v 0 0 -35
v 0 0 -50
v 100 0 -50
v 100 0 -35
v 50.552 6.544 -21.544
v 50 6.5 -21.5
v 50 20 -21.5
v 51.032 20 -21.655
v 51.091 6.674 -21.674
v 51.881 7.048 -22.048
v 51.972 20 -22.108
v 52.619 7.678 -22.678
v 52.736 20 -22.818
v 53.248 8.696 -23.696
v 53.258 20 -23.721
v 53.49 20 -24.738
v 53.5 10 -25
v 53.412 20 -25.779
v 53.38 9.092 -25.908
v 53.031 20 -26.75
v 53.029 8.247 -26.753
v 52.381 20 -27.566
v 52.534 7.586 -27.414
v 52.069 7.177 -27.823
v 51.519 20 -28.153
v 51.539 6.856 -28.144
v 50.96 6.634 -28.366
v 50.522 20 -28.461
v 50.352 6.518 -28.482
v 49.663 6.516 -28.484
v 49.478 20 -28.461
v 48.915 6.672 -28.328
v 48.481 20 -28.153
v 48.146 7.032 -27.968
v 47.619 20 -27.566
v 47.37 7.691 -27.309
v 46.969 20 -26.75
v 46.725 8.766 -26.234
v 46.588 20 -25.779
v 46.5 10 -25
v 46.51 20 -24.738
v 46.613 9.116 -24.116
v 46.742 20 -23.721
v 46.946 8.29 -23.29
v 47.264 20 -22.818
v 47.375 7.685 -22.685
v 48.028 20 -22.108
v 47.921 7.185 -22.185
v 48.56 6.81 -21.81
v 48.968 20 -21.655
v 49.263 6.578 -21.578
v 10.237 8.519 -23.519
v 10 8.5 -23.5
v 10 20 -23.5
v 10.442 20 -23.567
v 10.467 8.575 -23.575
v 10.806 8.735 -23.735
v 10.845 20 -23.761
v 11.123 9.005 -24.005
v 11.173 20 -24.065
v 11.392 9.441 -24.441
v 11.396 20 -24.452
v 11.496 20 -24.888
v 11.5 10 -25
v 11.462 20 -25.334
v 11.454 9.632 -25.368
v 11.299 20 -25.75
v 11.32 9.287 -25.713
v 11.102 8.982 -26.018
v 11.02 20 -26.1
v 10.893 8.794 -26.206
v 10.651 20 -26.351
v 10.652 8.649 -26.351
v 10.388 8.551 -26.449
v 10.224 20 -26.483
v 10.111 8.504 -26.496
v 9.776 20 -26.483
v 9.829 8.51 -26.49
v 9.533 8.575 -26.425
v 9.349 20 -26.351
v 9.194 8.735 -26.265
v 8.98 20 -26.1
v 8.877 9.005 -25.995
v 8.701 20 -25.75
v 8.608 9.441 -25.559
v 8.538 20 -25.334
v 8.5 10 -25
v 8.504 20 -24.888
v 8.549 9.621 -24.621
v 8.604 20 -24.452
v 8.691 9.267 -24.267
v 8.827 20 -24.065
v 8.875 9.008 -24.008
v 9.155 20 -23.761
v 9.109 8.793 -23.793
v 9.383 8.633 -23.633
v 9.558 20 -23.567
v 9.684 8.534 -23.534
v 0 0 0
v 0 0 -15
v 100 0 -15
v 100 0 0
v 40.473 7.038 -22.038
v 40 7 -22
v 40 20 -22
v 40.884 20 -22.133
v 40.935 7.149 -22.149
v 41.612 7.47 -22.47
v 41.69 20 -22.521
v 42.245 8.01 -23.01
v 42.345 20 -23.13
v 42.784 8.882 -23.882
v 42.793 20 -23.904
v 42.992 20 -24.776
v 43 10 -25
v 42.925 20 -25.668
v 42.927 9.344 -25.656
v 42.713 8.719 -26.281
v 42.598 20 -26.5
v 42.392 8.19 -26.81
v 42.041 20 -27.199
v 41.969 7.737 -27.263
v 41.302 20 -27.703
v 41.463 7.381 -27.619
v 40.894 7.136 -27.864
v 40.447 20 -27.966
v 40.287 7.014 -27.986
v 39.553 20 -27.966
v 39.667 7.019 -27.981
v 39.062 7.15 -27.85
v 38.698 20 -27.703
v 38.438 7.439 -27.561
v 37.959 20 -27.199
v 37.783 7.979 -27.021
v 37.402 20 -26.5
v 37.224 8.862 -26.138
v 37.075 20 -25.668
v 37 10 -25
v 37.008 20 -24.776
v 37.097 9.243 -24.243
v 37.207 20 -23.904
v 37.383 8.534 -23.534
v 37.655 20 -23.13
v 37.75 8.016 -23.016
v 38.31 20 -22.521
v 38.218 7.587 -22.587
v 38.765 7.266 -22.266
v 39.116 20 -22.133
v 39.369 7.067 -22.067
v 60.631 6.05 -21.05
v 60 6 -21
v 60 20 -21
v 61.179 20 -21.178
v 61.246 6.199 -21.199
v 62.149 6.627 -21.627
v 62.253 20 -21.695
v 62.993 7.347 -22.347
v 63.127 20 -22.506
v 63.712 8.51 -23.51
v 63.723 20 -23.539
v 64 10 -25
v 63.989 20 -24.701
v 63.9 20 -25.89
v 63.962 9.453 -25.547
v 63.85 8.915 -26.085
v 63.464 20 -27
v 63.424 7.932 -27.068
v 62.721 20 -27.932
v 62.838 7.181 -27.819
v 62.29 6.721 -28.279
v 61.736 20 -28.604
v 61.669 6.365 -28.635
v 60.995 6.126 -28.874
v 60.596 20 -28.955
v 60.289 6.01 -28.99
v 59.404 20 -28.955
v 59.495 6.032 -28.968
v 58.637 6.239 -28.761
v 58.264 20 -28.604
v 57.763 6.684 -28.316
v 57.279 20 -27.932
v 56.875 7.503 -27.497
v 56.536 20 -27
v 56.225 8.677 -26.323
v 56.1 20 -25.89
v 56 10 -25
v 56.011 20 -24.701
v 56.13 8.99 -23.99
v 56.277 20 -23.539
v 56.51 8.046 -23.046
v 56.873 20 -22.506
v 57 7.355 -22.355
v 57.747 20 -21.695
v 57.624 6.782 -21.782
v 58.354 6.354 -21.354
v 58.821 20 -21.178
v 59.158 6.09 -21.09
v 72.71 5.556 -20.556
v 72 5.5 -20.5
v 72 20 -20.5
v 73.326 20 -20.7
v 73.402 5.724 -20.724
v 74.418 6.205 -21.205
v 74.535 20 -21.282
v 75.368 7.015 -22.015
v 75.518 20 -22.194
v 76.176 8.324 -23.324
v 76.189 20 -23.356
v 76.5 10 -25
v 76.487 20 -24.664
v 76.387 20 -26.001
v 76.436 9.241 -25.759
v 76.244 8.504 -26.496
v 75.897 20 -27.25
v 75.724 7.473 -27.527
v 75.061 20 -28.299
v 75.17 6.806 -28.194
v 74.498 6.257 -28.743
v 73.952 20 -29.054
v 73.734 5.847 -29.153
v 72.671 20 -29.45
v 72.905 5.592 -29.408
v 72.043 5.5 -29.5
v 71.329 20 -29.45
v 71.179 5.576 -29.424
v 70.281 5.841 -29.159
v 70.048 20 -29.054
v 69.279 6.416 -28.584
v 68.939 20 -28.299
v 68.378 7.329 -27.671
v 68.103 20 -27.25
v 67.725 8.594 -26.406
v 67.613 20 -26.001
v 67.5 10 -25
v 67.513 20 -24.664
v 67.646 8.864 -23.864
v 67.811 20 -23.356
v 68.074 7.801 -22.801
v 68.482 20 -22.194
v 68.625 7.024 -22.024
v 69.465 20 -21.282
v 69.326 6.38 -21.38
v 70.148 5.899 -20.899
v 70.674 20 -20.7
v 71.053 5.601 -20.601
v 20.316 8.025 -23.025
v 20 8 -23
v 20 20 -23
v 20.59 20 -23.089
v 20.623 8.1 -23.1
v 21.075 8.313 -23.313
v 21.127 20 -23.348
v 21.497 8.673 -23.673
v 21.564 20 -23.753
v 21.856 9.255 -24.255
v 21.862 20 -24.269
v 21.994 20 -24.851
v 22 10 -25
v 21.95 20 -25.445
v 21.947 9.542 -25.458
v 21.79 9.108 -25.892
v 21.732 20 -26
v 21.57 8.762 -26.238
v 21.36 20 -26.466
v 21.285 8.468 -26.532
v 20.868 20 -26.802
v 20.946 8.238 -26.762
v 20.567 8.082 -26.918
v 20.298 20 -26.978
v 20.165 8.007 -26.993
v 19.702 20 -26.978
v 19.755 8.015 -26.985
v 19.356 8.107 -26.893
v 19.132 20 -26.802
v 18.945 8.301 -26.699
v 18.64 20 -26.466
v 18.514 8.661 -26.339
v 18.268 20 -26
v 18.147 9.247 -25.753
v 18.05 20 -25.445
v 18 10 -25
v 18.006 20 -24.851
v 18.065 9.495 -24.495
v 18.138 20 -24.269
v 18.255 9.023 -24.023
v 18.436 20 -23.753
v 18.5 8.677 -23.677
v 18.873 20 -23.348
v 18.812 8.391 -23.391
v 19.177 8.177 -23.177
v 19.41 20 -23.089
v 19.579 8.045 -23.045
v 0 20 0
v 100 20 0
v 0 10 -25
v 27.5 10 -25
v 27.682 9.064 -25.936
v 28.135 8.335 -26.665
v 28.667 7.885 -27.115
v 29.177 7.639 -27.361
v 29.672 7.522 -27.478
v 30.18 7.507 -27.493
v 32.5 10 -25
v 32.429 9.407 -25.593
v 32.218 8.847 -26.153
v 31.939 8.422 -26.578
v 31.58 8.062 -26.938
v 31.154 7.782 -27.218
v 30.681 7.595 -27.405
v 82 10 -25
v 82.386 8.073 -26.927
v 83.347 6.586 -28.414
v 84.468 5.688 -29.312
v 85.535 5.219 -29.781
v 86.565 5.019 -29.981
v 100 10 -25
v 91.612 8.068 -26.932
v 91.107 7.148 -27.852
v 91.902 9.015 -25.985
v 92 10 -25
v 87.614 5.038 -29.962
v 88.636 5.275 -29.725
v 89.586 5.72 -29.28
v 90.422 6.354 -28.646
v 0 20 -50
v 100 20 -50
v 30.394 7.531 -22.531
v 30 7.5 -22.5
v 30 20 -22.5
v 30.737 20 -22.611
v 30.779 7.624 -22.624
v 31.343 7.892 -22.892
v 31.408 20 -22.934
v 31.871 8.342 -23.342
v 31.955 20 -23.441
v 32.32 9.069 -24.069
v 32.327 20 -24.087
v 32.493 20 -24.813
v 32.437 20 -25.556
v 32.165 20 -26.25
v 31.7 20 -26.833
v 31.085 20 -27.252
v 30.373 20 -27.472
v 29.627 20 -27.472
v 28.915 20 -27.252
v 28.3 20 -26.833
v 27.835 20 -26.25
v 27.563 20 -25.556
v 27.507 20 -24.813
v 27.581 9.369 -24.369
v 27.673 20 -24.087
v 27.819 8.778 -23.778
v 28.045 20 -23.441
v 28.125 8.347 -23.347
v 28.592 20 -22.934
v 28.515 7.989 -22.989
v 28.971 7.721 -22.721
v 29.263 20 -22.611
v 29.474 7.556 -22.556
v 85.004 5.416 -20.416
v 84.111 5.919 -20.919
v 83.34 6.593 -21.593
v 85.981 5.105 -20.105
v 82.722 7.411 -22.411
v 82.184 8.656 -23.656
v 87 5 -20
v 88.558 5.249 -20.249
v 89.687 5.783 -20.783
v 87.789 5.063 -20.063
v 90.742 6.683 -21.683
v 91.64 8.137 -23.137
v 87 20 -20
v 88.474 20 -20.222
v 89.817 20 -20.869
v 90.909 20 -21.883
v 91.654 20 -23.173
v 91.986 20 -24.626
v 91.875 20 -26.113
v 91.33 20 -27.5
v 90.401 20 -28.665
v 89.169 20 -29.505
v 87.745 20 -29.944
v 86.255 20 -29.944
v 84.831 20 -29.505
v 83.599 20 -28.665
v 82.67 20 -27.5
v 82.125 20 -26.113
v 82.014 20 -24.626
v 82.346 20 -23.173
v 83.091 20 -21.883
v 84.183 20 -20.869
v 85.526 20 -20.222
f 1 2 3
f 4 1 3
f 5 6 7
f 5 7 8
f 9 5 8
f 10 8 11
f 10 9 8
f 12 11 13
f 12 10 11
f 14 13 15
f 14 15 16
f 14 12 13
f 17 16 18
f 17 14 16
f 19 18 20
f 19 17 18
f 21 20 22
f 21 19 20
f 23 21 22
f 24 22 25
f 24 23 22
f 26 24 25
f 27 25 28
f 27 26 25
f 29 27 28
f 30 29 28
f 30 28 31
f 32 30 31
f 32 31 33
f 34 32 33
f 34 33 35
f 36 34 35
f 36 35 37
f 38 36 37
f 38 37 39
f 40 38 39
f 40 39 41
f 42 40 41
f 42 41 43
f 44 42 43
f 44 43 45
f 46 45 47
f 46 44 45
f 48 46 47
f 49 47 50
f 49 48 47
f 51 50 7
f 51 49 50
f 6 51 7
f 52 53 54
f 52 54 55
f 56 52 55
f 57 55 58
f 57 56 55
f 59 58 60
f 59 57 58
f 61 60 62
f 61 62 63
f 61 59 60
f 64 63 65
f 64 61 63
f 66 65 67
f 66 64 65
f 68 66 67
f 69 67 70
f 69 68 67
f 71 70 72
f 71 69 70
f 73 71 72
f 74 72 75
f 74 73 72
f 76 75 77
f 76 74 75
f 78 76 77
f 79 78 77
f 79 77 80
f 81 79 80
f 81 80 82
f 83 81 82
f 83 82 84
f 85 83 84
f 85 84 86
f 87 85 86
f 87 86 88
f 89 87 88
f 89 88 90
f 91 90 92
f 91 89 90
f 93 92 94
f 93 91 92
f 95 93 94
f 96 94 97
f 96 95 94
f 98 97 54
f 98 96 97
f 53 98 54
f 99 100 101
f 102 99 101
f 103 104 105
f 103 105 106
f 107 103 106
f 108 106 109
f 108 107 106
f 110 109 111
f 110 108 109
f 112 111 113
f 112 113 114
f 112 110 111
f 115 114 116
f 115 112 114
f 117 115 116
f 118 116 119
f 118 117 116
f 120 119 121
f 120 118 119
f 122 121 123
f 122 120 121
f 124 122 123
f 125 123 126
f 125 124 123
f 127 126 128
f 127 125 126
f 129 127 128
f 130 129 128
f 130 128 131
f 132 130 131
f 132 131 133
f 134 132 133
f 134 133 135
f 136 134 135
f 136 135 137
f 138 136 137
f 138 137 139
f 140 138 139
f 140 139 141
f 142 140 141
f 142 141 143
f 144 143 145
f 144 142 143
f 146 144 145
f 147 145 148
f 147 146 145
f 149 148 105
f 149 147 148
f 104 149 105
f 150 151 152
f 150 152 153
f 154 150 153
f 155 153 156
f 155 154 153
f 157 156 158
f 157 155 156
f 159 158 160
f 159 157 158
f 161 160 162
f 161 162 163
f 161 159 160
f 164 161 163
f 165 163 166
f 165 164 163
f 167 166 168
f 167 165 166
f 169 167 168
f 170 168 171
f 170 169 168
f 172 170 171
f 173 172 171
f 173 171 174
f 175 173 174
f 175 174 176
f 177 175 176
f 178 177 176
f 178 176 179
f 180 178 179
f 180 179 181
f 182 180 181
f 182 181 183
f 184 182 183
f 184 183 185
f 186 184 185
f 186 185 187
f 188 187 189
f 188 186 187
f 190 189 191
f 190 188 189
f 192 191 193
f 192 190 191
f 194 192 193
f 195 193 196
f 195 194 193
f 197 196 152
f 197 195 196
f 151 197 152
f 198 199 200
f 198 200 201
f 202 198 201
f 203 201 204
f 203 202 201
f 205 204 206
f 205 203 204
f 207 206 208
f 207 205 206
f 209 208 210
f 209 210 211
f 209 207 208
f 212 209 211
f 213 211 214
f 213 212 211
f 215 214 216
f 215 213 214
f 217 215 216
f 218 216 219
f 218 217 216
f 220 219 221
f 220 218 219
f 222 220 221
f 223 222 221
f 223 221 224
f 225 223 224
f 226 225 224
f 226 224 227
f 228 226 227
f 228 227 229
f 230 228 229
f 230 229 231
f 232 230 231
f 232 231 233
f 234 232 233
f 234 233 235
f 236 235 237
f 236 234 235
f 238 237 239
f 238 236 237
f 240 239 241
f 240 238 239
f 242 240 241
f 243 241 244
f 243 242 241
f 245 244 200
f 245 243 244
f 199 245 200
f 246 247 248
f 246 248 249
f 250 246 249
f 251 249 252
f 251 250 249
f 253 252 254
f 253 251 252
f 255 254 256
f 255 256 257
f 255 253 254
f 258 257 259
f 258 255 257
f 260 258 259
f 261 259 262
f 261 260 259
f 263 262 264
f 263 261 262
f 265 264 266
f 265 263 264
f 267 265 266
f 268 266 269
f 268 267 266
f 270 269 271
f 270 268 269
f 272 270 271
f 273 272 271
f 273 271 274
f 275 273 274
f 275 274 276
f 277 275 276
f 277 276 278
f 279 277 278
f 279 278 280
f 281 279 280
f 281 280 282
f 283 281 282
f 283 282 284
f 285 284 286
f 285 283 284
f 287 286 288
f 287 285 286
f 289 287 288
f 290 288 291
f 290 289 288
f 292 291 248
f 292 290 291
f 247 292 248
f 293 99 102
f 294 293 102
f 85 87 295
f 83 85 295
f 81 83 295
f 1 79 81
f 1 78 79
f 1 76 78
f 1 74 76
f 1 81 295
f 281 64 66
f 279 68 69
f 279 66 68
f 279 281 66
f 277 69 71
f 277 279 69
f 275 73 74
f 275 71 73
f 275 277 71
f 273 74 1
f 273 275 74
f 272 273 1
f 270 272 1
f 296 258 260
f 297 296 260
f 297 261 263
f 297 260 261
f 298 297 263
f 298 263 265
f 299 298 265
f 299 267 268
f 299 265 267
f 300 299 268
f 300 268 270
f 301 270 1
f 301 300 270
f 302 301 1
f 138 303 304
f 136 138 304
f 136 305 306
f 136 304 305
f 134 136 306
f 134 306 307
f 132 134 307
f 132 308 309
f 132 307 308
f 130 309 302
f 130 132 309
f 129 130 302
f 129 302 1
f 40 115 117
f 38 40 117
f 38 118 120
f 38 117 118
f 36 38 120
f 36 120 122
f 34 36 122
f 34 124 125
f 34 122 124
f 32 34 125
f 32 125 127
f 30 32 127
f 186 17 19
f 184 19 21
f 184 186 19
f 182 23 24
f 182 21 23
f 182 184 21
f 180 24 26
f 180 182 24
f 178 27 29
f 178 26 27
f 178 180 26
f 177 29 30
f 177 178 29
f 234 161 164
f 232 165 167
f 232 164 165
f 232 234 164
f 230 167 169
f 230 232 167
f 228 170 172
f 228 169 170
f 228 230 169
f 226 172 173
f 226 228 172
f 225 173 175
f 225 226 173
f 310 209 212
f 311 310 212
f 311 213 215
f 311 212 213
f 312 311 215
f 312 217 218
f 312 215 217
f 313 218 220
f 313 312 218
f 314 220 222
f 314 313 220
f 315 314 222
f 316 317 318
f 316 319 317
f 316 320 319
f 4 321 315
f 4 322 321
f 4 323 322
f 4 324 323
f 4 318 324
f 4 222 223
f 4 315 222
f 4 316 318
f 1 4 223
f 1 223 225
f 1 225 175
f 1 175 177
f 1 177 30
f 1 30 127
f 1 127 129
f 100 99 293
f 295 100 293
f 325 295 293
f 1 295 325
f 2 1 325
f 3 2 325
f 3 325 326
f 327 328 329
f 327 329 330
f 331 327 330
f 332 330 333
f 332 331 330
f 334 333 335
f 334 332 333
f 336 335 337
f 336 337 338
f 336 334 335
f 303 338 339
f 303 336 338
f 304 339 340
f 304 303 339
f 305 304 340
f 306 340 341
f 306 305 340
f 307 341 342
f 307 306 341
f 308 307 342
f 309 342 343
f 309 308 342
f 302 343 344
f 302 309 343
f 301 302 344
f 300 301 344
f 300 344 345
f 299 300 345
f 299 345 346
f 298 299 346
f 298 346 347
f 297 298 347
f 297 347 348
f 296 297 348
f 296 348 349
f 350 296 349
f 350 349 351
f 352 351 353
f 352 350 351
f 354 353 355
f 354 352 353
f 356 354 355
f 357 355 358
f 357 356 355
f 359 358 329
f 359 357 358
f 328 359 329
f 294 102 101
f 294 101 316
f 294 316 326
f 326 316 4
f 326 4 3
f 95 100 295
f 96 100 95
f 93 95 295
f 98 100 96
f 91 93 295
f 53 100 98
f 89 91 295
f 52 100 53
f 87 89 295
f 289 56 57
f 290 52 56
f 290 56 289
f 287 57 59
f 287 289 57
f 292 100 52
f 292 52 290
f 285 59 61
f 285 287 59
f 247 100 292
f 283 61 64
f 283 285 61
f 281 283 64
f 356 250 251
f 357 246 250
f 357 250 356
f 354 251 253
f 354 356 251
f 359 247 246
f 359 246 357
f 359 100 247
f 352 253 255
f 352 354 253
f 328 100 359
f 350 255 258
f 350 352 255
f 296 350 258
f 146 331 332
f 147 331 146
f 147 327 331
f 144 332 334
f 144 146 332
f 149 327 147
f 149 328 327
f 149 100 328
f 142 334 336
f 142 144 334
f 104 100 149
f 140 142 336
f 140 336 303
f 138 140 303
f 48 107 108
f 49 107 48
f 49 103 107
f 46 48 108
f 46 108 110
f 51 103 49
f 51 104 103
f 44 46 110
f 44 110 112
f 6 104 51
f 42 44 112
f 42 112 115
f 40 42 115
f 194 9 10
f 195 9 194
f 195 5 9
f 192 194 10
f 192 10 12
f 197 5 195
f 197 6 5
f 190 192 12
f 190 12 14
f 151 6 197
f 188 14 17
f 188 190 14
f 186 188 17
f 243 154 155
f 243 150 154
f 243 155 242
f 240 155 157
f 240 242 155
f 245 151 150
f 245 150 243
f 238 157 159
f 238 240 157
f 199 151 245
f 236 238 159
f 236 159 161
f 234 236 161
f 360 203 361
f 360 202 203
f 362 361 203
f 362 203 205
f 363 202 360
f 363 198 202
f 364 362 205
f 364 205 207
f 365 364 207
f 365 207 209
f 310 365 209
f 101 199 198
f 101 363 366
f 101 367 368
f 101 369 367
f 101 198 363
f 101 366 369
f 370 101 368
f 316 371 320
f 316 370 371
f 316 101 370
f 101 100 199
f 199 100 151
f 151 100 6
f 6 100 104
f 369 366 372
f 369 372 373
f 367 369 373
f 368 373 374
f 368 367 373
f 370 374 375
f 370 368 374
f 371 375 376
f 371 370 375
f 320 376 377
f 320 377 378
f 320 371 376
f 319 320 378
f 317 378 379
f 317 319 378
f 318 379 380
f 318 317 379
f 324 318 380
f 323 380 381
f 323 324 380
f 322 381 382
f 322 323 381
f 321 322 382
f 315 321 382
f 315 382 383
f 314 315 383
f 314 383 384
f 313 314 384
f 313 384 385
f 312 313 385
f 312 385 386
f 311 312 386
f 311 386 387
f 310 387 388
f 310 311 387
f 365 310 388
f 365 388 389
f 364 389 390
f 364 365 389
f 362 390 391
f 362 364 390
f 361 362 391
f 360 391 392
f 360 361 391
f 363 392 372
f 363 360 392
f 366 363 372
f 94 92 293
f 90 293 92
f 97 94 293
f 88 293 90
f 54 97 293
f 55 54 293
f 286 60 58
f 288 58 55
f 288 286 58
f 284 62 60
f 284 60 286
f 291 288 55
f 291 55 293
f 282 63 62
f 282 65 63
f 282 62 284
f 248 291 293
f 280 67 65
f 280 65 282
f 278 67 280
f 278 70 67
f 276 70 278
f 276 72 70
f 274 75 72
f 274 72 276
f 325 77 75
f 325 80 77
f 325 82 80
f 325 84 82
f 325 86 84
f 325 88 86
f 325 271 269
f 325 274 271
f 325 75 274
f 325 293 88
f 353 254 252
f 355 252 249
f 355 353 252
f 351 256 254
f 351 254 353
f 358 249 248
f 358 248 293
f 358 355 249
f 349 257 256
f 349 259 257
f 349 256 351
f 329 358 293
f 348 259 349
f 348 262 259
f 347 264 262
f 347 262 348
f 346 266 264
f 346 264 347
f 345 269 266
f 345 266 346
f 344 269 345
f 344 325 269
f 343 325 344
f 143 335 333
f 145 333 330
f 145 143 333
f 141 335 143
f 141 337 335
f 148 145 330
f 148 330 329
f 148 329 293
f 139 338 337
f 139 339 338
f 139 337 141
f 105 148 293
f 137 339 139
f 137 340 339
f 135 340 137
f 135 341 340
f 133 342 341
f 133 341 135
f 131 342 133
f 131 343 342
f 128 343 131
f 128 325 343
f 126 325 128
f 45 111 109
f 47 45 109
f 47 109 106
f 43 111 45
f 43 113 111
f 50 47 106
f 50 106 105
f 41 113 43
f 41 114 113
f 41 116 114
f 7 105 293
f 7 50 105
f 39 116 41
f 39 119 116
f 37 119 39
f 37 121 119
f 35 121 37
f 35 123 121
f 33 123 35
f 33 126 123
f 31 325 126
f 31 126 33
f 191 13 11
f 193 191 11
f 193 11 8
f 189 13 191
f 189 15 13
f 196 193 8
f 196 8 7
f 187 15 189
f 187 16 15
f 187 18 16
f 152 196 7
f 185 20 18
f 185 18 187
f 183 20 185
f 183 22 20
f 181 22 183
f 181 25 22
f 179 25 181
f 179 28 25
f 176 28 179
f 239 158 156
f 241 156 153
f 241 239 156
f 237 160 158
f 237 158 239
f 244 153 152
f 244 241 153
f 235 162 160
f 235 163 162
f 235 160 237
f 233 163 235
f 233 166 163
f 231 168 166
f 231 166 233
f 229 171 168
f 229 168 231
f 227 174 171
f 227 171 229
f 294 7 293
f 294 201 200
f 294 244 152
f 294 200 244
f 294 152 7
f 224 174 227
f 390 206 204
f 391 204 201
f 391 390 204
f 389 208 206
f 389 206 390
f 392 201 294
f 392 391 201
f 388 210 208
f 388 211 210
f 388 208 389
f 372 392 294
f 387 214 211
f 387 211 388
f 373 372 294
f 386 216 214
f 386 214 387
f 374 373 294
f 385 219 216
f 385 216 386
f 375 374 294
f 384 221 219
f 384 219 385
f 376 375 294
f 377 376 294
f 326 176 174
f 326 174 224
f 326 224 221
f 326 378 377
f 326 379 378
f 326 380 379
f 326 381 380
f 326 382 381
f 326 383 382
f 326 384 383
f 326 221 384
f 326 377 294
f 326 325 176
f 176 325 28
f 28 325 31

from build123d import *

# Parameters (mm, degrees)
SKETCH1_W           = 100
SKETCH1_H           = 50
SKETCH1_R           = 1.5
SKETCH1_R_2         = 2
SKETCH1_R_3         = 2.5
SKETCH1_R_4         = 3
SKETCH1_R_5         = 3.5
SKETCH1_R_6         = 4
SKETCH1_R_7         = 4.5
SKETCH1_R_8         = 5
BOSS_EXTRUDE1_DEPTH = 20
CUT_EXTRUDE2_DEPTH  = 114.578166916


with BuildPart() as part:
    # Sketch1 → Boss-Extrude1 (new body)
    with BuildSketch(Plane(origin=(0, 0, 0), x_dir=(1, 0, 0), z_dir=(0, 1, 0))):
        with Locations((50, 25)):
            Rectangle(SKETCH1_W, SKETCH1_H)
        with Locations(Location((10, 25, 0), (0, 0, 270))):
            Circle(SKETCH1_R, mode=Mode.SUBTRACT)
        with Locations(Location((20, 25, 0), (0, 0, 270))):
            Circle(SKETCH1_R_2, mode=Mode.SUBTRACT)
        with Locations(Location((30, 25, 0), (0, 0, 270))):
            Circle(SKETCH1_R_3, mode=Mode.SUBTRACT)
        with Locations(Location((40, 25, 0), (0, 0, 270))):
            Circle(SKETCH1_R_4, mode=Mode.SUBTRACT)
        with Locations(Location((50, 25, 0), (0, 0, 270))):
            Circle(SKETCH1_R_5, mode=Mode.SUBTRACT)
        with Locations(Location((60, 25, 0), (0, 0, 270))):
            Circle(SKETCH1_R_6, mode=Mode.SUBTRACT)
        with Locations(Location((72, 25, 0), (0, 0, 270))):
            Circle(SKETCH1_R_7, mode=Mode.SUBTRACT)
        with Locations(Location((87, 25, 0), (0, 0, 270))):
            Circle(SKETCH1_R_8, mode=Mode.SUBTRACT)
    extrude(amount=BOSS_EXTRUDE1_DEPTH)

    # Sketch2 → Cut-Extrude2 (cut, through all)
    with BuildSketch(Plane(origin=(100, 0, 0), x_dir=(0, 0, -1), z_dir=(1, 0, 0))):
        Polygon((15, 0), (25, 10), (35, 0), align=None)
    extrude(amount=-CUT_EXTRUDE2_DEPTH, mode=Mode.SUBTRACT)


solid = part.part
